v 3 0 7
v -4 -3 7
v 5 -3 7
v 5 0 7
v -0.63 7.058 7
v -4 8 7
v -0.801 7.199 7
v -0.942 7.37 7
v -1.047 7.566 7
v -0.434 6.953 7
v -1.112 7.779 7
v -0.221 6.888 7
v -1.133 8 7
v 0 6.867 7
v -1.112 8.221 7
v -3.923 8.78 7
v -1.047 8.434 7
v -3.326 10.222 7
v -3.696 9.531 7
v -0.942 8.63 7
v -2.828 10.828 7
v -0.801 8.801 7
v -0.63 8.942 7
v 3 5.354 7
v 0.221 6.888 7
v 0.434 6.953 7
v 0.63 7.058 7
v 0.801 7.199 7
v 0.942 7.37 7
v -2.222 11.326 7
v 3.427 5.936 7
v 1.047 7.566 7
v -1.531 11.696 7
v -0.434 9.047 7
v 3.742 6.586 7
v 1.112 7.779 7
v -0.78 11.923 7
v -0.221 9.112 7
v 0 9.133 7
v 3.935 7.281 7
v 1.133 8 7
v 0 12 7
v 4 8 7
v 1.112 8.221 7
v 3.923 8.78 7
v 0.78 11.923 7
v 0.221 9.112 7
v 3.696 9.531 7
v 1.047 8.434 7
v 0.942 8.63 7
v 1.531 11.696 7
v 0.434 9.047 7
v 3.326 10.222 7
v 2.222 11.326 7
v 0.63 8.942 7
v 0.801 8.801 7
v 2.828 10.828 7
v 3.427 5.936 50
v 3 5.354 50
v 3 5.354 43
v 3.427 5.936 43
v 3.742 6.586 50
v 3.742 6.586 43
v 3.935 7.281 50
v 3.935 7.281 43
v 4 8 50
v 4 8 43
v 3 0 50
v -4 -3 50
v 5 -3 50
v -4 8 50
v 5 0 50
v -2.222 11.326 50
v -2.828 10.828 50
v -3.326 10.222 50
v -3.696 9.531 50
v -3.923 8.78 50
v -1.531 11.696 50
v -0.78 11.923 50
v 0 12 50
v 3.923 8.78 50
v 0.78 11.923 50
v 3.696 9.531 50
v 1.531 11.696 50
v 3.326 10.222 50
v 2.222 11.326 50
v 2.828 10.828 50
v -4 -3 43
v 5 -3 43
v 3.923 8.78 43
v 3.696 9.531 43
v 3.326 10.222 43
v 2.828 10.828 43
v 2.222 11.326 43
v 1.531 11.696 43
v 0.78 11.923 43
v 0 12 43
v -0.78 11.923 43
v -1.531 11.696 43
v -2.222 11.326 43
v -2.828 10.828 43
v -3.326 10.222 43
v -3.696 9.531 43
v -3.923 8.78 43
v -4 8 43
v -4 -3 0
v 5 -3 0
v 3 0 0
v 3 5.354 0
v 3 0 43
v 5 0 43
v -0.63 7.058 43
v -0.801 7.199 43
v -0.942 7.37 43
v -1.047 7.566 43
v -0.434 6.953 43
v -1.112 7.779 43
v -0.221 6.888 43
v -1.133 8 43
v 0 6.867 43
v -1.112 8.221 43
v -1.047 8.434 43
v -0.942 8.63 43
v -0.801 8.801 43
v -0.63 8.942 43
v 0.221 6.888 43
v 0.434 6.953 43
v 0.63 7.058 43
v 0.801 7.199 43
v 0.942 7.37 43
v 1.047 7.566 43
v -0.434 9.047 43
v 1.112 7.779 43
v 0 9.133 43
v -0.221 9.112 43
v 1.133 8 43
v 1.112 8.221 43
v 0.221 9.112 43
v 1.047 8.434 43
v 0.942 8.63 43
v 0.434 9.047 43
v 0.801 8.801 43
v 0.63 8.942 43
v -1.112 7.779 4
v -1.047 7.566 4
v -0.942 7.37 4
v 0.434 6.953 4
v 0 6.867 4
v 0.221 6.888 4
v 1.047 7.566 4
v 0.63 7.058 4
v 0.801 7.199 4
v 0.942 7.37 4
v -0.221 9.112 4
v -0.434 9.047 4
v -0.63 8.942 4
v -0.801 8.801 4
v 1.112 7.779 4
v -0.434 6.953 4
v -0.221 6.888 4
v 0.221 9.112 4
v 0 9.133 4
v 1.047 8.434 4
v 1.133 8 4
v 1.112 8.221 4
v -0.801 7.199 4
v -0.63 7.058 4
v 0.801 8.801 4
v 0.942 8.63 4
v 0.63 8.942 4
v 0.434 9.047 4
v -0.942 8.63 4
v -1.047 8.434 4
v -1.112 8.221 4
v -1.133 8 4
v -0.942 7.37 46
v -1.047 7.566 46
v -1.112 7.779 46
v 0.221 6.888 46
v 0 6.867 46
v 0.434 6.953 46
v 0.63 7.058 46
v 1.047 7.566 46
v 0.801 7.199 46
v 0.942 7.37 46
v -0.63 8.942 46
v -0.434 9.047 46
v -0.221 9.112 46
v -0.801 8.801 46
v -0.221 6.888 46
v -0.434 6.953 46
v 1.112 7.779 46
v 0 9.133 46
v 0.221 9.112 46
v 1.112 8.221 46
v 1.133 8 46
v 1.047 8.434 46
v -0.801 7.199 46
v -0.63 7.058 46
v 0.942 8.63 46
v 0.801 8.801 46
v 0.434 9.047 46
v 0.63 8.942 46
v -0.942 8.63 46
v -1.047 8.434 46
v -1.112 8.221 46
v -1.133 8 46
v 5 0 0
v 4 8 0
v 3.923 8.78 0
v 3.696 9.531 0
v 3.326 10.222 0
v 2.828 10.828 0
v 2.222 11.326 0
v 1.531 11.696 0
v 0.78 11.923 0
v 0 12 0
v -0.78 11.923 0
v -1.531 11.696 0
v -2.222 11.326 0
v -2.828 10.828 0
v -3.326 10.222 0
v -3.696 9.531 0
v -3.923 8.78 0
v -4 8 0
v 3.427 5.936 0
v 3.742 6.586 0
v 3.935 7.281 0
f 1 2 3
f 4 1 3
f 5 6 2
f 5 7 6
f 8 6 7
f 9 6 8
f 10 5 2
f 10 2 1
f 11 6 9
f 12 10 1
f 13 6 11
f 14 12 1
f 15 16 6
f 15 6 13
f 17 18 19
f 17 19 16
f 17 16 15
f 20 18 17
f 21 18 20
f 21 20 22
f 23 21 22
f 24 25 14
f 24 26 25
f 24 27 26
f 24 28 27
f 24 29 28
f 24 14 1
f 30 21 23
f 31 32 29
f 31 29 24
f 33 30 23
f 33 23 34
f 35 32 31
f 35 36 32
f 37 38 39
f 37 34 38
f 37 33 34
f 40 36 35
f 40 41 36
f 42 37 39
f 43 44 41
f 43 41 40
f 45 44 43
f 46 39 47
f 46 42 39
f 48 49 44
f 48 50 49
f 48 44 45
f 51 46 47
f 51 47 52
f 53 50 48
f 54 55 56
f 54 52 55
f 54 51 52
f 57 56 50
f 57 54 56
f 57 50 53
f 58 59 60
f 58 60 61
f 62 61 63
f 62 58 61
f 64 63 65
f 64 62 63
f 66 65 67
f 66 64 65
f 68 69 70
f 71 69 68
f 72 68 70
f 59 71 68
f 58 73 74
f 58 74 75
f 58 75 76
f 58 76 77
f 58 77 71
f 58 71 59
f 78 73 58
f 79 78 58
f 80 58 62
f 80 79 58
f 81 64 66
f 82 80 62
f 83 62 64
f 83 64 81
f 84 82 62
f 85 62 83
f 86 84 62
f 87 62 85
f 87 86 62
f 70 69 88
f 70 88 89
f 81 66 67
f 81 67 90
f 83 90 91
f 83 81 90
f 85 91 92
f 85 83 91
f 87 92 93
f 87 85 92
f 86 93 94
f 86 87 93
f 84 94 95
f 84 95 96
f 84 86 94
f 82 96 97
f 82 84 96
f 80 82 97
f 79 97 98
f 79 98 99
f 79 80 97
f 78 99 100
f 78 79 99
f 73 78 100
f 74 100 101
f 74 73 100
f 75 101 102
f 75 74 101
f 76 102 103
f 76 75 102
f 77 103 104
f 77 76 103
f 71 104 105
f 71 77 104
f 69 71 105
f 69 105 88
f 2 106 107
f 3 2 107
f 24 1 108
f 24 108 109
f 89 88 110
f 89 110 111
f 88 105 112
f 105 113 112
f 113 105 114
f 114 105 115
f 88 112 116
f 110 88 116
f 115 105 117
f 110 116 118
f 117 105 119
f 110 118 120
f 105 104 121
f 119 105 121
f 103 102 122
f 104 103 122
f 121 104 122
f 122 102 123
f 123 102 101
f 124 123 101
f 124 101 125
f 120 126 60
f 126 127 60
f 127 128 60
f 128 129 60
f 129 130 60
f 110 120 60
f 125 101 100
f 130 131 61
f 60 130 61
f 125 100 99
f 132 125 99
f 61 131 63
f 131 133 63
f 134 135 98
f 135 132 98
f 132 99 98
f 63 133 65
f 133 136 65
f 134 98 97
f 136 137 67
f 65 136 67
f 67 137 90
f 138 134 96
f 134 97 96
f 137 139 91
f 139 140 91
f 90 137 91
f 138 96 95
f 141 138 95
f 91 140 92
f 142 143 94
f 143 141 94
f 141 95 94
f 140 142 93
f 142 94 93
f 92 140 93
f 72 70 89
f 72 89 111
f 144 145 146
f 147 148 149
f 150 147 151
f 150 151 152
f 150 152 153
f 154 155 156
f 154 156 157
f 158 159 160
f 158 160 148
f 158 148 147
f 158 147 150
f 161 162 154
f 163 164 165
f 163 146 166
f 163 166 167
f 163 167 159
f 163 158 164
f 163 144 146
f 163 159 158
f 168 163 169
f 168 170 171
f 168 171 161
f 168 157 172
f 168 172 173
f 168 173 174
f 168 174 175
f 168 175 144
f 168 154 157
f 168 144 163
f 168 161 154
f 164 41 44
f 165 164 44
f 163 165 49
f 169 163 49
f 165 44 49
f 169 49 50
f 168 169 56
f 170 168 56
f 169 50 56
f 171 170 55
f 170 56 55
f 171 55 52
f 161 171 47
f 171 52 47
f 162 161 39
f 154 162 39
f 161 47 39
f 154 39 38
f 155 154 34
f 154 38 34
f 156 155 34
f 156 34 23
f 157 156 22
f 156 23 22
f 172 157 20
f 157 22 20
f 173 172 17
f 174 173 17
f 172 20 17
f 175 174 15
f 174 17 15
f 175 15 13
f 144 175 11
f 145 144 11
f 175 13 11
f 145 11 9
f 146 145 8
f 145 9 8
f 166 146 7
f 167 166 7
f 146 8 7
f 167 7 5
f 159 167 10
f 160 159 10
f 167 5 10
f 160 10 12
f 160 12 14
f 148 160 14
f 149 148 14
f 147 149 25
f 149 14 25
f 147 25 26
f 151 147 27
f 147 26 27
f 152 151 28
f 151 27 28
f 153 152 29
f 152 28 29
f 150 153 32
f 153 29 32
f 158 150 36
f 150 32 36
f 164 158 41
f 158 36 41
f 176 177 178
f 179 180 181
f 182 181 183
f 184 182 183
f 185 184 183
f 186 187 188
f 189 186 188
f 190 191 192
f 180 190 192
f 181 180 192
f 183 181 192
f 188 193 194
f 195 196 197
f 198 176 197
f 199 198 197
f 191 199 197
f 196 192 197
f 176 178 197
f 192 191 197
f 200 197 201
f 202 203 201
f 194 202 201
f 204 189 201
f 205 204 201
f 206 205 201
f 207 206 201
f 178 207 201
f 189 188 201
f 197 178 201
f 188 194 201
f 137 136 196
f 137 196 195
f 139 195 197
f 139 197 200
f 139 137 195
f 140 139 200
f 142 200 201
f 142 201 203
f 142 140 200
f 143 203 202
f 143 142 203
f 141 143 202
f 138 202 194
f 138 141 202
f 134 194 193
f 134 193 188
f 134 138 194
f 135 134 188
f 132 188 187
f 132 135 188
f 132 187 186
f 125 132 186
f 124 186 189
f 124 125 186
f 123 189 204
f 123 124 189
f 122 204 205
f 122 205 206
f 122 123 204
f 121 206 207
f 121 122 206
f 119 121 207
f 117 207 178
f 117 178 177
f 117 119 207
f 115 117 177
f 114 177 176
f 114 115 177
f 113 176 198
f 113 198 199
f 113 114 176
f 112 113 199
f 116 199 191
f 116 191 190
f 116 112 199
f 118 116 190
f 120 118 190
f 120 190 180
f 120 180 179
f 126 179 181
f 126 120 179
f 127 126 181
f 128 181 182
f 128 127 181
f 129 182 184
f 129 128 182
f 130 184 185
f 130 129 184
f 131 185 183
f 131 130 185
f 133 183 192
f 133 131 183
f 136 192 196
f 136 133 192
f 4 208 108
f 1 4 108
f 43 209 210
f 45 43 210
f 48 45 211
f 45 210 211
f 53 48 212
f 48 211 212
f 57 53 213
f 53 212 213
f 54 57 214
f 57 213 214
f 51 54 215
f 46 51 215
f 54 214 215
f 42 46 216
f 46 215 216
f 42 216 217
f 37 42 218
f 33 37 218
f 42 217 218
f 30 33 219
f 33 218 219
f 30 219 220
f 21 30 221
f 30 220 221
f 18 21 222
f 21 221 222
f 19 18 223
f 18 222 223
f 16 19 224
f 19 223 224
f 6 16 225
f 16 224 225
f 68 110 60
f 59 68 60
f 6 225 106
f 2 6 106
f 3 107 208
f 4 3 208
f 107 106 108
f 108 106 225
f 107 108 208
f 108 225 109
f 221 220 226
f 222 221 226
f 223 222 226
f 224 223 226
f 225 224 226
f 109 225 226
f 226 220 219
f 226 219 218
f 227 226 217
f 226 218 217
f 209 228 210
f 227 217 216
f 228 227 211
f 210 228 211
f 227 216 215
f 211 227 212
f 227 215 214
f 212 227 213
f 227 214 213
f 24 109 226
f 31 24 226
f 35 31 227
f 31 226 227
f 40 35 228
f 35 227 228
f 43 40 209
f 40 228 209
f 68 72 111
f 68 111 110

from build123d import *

# Parameters (mm, degrees)
F1_DEPTH = 7
F2_R     = 1.133333
F4_DEPTH = 3


with BuildPart() as f1:
    # F0 (on Top) → F1 (new body)
    with BuildSketch(Plane.XY):
        with BuildLine():
            ThreePointArc((3, 5.354249), (-1.414214, 4.258343), (-4, 8))
            Line((-4, 8), (-4, -3))
            Line((-4, -3), (5, -3))
            Line((5, -3), (5, 0))
            Line((5, 0), (3, 0))
            Line((3, 0), (3, 5.354249))
        make_face()
        with BuildLine():
            ThreePointArc((3, 5.354249), (3.741657, 6.585786), (4, 8))
            ThreePointArc((4, 8), (0, 12), (-4, 8))
            ThreePointArc((-4, 8), (-1.414214, 4.258343), (3, 5.354249))
        make_face()
    extrude(amount=F1_DEPTH)

    # F2 (on face) → F4 (cut)
    with BuildSketch(Plane.XY.offset(7)):
        with Locations((0, 8)):
            Circle(F2_R)
    extrude(amount=-F4_DEPTH, mode=Mode.SUBTRACT)


with BuildPart() as f5_1:
    # F5: instance of F1
    add(f1.part.mirror(Plane.XY.offset(25)))


solid = Compound([f1.part, f5_1.part])
